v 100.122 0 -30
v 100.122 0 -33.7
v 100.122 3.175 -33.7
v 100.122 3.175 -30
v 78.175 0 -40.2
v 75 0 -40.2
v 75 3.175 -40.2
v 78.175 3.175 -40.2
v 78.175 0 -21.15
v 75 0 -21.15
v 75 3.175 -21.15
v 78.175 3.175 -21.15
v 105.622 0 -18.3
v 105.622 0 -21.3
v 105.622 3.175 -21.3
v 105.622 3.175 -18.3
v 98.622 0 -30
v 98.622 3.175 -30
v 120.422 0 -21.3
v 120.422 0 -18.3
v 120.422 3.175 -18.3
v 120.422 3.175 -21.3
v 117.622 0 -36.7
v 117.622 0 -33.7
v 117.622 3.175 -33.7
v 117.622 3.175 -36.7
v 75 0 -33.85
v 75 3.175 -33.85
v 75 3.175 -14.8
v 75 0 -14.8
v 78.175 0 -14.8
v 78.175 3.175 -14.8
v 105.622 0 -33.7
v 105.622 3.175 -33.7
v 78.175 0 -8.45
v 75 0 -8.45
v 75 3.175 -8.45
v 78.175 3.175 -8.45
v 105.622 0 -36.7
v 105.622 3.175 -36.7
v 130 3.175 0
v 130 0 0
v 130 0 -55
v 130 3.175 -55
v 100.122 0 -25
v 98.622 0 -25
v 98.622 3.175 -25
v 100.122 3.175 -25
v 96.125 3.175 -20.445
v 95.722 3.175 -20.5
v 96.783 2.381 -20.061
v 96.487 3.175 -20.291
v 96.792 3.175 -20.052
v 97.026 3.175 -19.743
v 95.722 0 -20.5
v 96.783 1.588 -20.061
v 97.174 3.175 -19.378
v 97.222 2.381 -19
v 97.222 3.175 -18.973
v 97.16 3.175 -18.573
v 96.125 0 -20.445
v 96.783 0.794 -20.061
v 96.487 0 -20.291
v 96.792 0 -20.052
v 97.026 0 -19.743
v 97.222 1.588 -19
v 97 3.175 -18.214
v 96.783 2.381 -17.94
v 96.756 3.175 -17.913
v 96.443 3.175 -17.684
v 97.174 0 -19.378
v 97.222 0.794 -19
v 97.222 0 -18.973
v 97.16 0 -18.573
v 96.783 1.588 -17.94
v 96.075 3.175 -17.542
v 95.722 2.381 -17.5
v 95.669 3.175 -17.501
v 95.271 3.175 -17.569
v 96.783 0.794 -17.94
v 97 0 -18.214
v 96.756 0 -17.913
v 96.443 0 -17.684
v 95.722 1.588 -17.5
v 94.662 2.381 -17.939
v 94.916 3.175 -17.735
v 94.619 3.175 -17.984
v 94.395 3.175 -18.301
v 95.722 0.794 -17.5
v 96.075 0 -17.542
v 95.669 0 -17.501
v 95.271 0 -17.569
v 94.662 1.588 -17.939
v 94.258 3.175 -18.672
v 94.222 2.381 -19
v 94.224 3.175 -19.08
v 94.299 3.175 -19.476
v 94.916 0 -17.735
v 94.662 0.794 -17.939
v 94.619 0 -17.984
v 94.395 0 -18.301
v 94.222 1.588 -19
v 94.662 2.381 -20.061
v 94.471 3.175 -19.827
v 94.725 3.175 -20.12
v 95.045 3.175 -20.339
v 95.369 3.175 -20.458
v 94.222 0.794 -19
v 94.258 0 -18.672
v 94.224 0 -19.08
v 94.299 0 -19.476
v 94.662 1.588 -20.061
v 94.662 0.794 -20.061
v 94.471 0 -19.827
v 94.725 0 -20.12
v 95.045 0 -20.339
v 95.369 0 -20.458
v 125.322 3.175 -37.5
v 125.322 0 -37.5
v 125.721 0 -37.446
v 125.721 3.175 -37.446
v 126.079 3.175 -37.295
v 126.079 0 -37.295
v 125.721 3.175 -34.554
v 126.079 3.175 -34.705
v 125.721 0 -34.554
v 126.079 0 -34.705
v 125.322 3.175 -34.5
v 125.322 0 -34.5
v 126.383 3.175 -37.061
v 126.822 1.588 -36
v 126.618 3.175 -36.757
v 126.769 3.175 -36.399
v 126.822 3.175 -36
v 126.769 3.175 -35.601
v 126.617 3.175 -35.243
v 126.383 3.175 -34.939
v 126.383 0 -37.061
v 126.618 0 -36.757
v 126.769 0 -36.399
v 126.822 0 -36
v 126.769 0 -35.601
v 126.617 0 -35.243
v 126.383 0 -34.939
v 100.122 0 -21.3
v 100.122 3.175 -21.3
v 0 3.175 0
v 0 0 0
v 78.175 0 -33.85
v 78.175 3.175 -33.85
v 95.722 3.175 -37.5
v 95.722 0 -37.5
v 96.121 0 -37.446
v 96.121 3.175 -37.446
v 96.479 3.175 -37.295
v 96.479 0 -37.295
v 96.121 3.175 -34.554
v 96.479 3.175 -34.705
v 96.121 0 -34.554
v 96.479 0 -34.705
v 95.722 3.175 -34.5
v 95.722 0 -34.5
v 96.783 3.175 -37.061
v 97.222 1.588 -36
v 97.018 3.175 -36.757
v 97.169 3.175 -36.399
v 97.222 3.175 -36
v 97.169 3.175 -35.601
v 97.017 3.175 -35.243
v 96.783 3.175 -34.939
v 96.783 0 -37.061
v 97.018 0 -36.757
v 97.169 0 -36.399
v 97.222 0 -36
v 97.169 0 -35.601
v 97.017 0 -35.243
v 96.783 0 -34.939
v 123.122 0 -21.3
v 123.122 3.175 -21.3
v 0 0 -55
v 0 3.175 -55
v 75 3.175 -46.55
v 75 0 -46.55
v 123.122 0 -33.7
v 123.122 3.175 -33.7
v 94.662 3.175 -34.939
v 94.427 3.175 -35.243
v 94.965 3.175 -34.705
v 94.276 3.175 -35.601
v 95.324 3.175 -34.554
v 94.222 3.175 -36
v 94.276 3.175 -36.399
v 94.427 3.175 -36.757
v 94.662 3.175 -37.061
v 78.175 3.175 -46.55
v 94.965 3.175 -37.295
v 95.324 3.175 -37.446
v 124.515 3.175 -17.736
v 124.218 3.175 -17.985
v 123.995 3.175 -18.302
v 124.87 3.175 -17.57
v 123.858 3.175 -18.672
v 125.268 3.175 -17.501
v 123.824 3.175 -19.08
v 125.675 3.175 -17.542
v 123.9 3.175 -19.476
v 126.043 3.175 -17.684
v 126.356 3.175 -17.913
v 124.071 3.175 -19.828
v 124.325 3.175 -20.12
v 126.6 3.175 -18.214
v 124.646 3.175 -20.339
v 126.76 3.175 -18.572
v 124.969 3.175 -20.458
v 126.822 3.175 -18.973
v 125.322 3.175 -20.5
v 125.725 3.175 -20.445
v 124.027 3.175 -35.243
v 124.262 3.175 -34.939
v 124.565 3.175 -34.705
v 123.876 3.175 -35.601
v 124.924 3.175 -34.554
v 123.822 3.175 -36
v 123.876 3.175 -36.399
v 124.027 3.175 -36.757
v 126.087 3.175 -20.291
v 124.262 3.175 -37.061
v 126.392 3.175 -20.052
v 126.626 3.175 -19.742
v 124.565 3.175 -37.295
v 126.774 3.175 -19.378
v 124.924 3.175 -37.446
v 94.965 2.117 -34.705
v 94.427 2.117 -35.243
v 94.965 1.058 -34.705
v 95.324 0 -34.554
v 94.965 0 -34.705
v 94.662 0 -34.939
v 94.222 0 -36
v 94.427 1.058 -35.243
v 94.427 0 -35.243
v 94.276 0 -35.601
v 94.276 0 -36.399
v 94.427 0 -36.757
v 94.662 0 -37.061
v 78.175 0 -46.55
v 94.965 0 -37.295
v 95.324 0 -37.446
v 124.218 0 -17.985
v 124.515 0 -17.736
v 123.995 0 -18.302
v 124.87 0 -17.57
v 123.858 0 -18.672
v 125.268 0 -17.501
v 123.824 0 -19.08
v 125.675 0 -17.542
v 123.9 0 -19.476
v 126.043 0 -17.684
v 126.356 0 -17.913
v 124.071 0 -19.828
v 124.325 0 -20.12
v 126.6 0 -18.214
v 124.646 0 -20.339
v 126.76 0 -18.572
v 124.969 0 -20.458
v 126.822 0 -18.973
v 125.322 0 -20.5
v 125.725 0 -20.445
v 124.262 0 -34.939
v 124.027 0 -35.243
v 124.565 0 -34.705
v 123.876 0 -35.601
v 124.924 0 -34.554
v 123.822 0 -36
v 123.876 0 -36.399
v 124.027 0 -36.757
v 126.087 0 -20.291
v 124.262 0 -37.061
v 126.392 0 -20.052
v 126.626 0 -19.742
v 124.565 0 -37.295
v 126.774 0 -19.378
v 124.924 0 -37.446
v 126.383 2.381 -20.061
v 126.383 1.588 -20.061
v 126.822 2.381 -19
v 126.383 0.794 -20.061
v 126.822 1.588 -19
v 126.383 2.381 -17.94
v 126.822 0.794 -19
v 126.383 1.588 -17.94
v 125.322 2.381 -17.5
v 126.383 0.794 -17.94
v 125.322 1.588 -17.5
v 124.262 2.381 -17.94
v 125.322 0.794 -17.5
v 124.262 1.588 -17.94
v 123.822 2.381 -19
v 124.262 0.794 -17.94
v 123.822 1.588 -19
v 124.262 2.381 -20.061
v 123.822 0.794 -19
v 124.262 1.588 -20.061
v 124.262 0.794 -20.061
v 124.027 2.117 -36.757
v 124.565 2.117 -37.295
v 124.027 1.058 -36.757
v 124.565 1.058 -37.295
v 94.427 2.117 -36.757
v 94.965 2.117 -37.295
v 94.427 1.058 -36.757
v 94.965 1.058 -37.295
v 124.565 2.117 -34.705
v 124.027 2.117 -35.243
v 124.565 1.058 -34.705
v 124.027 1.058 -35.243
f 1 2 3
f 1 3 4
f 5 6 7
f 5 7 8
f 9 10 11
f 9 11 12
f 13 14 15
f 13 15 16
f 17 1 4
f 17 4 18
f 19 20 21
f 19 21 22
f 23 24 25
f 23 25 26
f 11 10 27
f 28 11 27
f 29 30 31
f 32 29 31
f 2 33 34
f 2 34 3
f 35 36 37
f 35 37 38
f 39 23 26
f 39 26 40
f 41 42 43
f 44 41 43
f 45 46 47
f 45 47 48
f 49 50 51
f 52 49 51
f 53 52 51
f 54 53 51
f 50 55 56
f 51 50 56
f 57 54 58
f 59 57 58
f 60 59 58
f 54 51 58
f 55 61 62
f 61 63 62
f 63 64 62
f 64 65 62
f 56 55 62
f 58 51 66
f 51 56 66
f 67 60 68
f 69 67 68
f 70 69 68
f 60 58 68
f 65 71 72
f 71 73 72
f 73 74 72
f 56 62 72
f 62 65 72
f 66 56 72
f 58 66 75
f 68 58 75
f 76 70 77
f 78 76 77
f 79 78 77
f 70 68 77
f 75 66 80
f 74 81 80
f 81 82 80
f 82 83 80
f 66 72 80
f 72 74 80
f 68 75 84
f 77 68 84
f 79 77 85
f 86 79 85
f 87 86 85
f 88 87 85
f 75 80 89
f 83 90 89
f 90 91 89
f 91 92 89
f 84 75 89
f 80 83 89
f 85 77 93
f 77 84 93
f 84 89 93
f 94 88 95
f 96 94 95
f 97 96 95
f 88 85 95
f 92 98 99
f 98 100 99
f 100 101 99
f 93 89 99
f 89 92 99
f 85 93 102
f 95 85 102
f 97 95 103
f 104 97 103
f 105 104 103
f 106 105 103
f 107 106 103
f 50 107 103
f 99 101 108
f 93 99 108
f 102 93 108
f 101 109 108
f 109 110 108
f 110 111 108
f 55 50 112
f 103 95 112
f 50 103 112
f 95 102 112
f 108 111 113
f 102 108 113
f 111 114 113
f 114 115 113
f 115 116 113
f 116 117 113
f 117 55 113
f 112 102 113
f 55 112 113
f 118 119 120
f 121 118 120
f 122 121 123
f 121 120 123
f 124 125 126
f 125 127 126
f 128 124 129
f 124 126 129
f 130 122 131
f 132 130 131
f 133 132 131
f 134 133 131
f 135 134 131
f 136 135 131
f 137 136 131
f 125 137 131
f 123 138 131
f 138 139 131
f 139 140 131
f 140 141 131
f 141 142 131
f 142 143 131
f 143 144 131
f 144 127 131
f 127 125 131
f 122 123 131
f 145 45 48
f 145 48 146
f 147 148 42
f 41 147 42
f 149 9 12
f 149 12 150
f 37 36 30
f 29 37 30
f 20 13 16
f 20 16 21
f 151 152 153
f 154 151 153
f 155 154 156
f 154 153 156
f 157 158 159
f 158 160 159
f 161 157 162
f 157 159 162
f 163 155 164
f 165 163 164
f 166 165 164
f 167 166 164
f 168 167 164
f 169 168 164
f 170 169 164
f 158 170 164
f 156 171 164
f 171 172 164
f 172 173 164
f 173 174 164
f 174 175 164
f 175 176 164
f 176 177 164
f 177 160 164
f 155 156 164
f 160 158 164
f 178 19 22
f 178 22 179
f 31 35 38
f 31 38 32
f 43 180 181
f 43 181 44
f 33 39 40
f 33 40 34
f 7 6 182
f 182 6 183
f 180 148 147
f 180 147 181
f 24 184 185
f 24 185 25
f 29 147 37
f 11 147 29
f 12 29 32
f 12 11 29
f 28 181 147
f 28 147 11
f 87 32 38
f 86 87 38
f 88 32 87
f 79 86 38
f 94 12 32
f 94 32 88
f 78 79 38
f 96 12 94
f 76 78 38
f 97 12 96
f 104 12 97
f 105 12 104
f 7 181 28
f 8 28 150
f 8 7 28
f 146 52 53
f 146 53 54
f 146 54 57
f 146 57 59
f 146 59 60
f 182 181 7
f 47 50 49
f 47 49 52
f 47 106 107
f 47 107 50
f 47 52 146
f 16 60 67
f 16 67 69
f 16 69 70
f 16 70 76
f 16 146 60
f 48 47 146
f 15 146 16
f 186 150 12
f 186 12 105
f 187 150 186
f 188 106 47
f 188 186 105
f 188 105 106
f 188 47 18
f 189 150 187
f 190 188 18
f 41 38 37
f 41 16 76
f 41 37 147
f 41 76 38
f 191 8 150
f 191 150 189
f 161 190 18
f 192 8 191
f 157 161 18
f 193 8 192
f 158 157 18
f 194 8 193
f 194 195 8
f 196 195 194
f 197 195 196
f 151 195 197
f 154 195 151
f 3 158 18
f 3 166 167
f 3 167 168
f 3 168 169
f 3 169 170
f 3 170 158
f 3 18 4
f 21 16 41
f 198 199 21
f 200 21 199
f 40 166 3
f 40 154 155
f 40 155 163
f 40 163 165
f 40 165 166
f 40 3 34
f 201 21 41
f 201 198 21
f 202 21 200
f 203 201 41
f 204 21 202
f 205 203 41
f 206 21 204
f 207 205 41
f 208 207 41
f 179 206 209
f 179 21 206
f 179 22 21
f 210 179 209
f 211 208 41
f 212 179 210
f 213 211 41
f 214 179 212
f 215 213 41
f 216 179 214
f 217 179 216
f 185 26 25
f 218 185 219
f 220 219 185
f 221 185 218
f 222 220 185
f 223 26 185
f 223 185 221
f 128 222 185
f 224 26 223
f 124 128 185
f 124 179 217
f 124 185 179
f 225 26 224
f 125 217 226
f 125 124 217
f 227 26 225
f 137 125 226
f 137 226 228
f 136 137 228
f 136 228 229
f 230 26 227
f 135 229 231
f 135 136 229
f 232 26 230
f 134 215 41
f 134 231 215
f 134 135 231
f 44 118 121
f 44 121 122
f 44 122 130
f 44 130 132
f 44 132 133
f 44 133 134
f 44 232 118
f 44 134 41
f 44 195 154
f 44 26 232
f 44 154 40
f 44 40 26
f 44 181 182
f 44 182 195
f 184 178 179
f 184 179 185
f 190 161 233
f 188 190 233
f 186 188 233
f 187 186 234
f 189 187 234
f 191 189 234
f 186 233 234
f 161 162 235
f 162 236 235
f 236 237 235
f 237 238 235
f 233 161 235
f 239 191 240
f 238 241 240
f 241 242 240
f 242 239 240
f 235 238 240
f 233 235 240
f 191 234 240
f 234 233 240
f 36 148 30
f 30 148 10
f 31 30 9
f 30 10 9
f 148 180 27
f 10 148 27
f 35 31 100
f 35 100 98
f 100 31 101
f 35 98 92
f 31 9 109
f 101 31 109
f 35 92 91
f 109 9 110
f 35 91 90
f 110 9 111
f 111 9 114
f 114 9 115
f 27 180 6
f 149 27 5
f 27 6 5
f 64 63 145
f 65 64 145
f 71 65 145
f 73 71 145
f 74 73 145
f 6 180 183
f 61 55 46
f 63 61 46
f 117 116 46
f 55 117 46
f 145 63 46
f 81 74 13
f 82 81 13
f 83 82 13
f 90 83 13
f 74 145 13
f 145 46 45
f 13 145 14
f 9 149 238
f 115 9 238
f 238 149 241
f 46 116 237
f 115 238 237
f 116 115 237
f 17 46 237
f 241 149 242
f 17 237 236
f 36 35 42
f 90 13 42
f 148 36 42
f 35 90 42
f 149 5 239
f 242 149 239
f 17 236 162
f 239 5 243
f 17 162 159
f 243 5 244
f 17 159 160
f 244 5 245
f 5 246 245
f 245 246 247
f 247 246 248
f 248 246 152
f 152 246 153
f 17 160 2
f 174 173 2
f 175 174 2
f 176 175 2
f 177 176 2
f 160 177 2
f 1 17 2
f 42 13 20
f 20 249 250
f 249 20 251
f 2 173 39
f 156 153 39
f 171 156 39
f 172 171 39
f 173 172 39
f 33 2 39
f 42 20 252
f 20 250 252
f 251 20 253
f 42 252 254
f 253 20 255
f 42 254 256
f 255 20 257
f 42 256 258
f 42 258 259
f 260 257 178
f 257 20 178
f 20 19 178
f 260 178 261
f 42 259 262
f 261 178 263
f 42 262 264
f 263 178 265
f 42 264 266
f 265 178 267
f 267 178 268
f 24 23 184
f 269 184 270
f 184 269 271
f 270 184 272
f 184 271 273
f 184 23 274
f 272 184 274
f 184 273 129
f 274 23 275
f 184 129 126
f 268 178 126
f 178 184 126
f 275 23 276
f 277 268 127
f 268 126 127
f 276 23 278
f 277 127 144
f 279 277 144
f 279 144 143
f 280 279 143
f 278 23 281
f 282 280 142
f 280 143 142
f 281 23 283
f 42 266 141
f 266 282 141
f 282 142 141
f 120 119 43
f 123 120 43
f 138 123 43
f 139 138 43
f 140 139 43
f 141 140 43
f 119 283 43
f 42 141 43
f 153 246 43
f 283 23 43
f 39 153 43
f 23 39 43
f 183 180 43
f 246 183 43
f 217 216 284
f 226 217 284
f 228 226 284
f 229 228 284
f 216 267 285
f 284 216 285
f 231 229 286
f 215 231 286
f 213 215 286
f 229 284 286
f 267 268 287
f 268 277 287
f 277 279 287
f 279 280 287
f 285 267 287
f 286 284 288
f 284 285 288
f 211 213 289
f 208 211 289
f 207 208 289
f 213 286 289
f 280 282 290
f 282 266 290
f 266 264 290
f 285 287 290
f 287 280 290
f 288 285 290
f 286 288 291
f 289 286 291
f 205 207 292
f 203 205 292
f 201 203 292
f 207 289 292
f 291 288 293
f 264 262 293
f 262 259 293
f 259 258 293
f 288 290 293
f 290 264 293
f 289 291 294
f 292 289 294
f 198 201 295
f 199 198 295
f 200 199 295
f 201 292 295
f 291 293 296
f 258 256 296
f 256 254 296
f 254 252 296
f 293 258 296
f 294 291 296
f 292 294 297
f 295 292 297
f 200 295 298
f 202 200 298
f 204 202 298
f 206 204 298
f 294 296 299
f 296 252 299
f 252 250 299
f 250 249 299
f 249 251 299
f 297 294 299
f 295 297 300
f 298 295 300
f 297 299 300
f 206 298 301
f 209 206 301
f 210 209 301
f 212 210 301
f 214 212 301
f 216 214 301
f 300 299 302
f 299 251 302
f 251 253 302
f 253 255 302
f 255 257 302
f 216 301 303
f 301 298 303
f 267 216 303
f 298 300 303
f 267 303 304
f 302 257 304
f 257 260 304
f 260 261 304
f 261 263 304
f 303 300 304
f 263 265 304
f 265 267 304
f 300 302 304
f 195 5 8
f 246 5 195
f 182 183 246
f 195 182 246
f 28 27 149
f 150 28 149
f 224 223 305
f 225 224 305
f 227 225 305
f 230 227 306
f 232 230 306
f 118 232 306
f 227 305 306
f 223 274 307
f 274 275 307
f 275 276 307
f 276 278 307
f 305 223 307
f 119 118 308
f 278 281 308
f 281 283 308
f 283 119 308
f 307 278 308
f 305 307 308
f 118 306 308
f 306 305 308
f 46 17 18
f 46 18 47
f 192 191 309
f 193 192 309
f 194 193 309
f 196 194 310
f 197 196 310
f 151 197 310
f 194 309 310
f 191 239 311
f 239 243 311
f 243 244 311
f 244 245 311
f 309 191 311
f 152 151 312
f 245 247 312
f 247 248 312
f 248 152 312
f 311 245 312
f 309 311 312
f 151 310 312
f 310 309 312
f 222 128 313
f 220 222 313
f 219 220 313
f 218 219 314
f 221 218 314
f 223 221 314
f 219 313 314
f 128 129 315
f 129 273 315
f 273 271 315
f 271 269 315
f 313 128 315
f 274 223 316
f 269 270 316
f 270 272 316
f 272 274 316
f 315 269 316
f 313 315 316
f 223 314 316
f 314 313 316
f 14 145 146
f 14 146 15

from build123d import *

# Parameters (mm, degrees)
SKETCH1_W           = 130
SKETCH1_H           = 55
SKETCH1_W_2         = 3.175
SKETCH1_H_2         = 6.35
SKETCH1_H_3         = 12.7
BOSS_EXTRUDE1_DEPTH = 3.175


with BuildPart() as part:
    # Sketch1 → Boss-Extrude1 (new body)
    with BuildSketch(Plane(origin=(0, 0, 0), x_dir=(1, 0, 0), z_dir=(0, 1, 0))):
        with Locations((65, 27.5)):
            Rectangle(SKETCH1_W, SKETCH1_H)
        with Locations((76.5875, 43.375)):
            Rectangle(SKETCH1_W_2, SKETCH1_H_2, mode=Mode.SUBTRACT)
        with Locations((76.5875, 11.625)):
            Rectangle(SKETCH1_W_2, SKETCH1_H_2, mode=Mode.SUBTRACT)
        with Locations((76.5875, 27.5)):
            Rectangle(SKETCH1_W_2, SKETCH1_H_3, mode=Mode.SUBTRACT)
        Polygon((98.622387284, 25), (100.122287284, 25), (100.122287284, 21.3), (105.622287284, 21.3), (105.622287284, 18.3002), (120.422287284, 18.3002), (120.422287284, 21.3), (123.122287284, 21.3), (123.122287284, 33.7), (117.622287284, 33.7), (117.622287284, 36.7), (105.622287284, 36.7), (105.622287284, 33.7), (100.122287284, 33.7), (100.122287284, 30), (98.622387284, 30), align=None, mode=Mode.SUBTRACT)
        with BuildLine():
            add(Edge.make_bspline(
                [(97.222287284, 36), (97.222287284, 35.1715), (96.550787284, 34.5), (95.722387284, 34.5)],
                knots=[0, 0, 0, 0, 0.2, 0.2, 0.2, 0.2], degree=3))
            add(Edge.make_bspline(
                [(95.722387284, 34.5), (94.893887284, 34.4999), (94.222387284, 35.1715), (94.222387284, 35.9999)],
                knots=[0.2, 0.2, 0.2, 0.2, 0.4, 0.4, 0.4, 0.4], degree=3))
            add(Edge.make_bspline(
                [(94.222387284, 35.9999), (94.222287284, 36.8284), (94.893887284, 37.4999), (95.722287284, 37.5)],
                knots=[0.4, 0.4, 0.4, 0.4, 0.6, 0.6, 0.6, 0.6], degree=3))
            add(Edge.make_bspline(
                [(95.722287284, 37.5), (96.550787284, 37.5), (97.222287284, 36.8284), (97.222287284, 36)],
                knots=[0.6, 0.6, 0.6, 0.6, 1, 1, 1, 1], degree=3))
        make_face(mode=Mode.SUBTRACT)
        with BuildLine():
            add(Edge.make_bspline(
                [(126.822287284, 19.0002), (126.822287284, 18.1718), (126.150687284, 17.5002), (125.322387284, 17.5002)],
                knots=[0, 0, 0, 0, 0.2, 0.2, 0.2, 0.2], degree=3))
            add(Edge.make_bspline(
                [(125.322387284, 17.5002), (124.493987284, 17.5002), (123.822387284, 18.1718), (123.822387284, 19.0001)],
                knots=[0.2, 0.2, 0.2, 0.2, 0.4, 0.4, 0.4, 0.4], degree=3))
            add(Edge.make_bspline(
                [(123.822387284, 19.0001), (123.822387284, 19.8285), (124.493987284, 20.4999), (125.322287284, 20.4999)],
                knots=[0.4, 0.4, 0.4, 0.4, 0.6, 0.6, 0.6, 0.6], degree=3))
            add(Edge.make_bspline(
                [(125.322287284, 20.4999), (126.150687284, 20.4999), (126.822287284, 19.8285), (126.822287284, 19.0002)],
                knots=[0.6, 0.6, 0.6, 0.6, 1, 1, 1, 1], degree=3))
        make_face(mode=Mode.SUBTRACT)
        with BuildLine():
            add(Edge.make_bspline(
                [(97.222287284, 19.0002), (97.222287284, 18.1718), (96.550687284, 17.5001), (95.722387284, 17.5001)],
                knots=[0, 0, 0, 0, 0.2, 0.2, 0.2, 0.2], degree=3))
            add(Edge.make_bspline(
                [(95.722387284, 17.5001), (94.893987284, 17.5001), (94.222287284, 18.1718), (94.222287284, 19.0001)],
                knots=[0.2, 0.2, 0.2, 0.2, 0.4, 0.4, 0.4, 0.4], degree=3))
            add(Edge.make_bspline(
                [(94.222287284, 19.0001), (94.222287284, 19.8285), (94.893987284, 20.5), (95.722287284, 20.5)],
                knots=[0.4, 0.4, 0.4, 0.4, 0.6, 0.6, 0.6, 0.6], degree=3))
            add(Edge.make_bspline(
                [(95.722287284, 20.5), (96.550687284, 20.5), (97.222287284, 19.8285), (97.222287284, 19.0002)],
                knots=[0.6, 0.6, 0.6, 0.6, 1, 1, 1, 1], degree=3))
        make_face(mode=Mode.SUBTRACT)
        with BuildLine():
            add(Edge.make_bspline(
                [(126.822287284, 36), (126.822287284, 35.1715), (126.150787284, 34.5001), (125.322387284, 34.5001)],
                knots=[0, 0, 0, 0, 0.2, 0.2, 0.2, 0.2], degree=3))
            add(Edge.make_bspline(
                [(125.322387284, 34.5001), (124.493887284, 34.5), (123.822487284, 35.1715), (123.822487284, 35.9999)],
                knots=[0.2, 0.2, 0.2, 0.2, 0.4, 0.4, 0.4, 0.4], degree=3))
            add(Edge.make_bspline(
                [(123.822487284, 35.9999), (123.822387284, 36.8284), (124.493887284, 37.4998), (125.322287284, 37.4999)],
                knots=[0.4, 0.4, 0.4, 0.4, 0.6, 0.6, 0.6, 0.6], degree=3))
            add(Edge.make_bspline(
                [(125.322287284, 37.4999), (126.150787284, 37.4999), (126.822287284, 36.8284), (126.822287284, 36)],
                knots=[0.6, 0.6, 0.6, 0.6, 1, 1, 1, 1], degree=3))
        make_face(mode=Mode.SUBTRACT)
    extrude(amount=BOSS_EXTRUDE1_DEPTH)


solid = part.part
